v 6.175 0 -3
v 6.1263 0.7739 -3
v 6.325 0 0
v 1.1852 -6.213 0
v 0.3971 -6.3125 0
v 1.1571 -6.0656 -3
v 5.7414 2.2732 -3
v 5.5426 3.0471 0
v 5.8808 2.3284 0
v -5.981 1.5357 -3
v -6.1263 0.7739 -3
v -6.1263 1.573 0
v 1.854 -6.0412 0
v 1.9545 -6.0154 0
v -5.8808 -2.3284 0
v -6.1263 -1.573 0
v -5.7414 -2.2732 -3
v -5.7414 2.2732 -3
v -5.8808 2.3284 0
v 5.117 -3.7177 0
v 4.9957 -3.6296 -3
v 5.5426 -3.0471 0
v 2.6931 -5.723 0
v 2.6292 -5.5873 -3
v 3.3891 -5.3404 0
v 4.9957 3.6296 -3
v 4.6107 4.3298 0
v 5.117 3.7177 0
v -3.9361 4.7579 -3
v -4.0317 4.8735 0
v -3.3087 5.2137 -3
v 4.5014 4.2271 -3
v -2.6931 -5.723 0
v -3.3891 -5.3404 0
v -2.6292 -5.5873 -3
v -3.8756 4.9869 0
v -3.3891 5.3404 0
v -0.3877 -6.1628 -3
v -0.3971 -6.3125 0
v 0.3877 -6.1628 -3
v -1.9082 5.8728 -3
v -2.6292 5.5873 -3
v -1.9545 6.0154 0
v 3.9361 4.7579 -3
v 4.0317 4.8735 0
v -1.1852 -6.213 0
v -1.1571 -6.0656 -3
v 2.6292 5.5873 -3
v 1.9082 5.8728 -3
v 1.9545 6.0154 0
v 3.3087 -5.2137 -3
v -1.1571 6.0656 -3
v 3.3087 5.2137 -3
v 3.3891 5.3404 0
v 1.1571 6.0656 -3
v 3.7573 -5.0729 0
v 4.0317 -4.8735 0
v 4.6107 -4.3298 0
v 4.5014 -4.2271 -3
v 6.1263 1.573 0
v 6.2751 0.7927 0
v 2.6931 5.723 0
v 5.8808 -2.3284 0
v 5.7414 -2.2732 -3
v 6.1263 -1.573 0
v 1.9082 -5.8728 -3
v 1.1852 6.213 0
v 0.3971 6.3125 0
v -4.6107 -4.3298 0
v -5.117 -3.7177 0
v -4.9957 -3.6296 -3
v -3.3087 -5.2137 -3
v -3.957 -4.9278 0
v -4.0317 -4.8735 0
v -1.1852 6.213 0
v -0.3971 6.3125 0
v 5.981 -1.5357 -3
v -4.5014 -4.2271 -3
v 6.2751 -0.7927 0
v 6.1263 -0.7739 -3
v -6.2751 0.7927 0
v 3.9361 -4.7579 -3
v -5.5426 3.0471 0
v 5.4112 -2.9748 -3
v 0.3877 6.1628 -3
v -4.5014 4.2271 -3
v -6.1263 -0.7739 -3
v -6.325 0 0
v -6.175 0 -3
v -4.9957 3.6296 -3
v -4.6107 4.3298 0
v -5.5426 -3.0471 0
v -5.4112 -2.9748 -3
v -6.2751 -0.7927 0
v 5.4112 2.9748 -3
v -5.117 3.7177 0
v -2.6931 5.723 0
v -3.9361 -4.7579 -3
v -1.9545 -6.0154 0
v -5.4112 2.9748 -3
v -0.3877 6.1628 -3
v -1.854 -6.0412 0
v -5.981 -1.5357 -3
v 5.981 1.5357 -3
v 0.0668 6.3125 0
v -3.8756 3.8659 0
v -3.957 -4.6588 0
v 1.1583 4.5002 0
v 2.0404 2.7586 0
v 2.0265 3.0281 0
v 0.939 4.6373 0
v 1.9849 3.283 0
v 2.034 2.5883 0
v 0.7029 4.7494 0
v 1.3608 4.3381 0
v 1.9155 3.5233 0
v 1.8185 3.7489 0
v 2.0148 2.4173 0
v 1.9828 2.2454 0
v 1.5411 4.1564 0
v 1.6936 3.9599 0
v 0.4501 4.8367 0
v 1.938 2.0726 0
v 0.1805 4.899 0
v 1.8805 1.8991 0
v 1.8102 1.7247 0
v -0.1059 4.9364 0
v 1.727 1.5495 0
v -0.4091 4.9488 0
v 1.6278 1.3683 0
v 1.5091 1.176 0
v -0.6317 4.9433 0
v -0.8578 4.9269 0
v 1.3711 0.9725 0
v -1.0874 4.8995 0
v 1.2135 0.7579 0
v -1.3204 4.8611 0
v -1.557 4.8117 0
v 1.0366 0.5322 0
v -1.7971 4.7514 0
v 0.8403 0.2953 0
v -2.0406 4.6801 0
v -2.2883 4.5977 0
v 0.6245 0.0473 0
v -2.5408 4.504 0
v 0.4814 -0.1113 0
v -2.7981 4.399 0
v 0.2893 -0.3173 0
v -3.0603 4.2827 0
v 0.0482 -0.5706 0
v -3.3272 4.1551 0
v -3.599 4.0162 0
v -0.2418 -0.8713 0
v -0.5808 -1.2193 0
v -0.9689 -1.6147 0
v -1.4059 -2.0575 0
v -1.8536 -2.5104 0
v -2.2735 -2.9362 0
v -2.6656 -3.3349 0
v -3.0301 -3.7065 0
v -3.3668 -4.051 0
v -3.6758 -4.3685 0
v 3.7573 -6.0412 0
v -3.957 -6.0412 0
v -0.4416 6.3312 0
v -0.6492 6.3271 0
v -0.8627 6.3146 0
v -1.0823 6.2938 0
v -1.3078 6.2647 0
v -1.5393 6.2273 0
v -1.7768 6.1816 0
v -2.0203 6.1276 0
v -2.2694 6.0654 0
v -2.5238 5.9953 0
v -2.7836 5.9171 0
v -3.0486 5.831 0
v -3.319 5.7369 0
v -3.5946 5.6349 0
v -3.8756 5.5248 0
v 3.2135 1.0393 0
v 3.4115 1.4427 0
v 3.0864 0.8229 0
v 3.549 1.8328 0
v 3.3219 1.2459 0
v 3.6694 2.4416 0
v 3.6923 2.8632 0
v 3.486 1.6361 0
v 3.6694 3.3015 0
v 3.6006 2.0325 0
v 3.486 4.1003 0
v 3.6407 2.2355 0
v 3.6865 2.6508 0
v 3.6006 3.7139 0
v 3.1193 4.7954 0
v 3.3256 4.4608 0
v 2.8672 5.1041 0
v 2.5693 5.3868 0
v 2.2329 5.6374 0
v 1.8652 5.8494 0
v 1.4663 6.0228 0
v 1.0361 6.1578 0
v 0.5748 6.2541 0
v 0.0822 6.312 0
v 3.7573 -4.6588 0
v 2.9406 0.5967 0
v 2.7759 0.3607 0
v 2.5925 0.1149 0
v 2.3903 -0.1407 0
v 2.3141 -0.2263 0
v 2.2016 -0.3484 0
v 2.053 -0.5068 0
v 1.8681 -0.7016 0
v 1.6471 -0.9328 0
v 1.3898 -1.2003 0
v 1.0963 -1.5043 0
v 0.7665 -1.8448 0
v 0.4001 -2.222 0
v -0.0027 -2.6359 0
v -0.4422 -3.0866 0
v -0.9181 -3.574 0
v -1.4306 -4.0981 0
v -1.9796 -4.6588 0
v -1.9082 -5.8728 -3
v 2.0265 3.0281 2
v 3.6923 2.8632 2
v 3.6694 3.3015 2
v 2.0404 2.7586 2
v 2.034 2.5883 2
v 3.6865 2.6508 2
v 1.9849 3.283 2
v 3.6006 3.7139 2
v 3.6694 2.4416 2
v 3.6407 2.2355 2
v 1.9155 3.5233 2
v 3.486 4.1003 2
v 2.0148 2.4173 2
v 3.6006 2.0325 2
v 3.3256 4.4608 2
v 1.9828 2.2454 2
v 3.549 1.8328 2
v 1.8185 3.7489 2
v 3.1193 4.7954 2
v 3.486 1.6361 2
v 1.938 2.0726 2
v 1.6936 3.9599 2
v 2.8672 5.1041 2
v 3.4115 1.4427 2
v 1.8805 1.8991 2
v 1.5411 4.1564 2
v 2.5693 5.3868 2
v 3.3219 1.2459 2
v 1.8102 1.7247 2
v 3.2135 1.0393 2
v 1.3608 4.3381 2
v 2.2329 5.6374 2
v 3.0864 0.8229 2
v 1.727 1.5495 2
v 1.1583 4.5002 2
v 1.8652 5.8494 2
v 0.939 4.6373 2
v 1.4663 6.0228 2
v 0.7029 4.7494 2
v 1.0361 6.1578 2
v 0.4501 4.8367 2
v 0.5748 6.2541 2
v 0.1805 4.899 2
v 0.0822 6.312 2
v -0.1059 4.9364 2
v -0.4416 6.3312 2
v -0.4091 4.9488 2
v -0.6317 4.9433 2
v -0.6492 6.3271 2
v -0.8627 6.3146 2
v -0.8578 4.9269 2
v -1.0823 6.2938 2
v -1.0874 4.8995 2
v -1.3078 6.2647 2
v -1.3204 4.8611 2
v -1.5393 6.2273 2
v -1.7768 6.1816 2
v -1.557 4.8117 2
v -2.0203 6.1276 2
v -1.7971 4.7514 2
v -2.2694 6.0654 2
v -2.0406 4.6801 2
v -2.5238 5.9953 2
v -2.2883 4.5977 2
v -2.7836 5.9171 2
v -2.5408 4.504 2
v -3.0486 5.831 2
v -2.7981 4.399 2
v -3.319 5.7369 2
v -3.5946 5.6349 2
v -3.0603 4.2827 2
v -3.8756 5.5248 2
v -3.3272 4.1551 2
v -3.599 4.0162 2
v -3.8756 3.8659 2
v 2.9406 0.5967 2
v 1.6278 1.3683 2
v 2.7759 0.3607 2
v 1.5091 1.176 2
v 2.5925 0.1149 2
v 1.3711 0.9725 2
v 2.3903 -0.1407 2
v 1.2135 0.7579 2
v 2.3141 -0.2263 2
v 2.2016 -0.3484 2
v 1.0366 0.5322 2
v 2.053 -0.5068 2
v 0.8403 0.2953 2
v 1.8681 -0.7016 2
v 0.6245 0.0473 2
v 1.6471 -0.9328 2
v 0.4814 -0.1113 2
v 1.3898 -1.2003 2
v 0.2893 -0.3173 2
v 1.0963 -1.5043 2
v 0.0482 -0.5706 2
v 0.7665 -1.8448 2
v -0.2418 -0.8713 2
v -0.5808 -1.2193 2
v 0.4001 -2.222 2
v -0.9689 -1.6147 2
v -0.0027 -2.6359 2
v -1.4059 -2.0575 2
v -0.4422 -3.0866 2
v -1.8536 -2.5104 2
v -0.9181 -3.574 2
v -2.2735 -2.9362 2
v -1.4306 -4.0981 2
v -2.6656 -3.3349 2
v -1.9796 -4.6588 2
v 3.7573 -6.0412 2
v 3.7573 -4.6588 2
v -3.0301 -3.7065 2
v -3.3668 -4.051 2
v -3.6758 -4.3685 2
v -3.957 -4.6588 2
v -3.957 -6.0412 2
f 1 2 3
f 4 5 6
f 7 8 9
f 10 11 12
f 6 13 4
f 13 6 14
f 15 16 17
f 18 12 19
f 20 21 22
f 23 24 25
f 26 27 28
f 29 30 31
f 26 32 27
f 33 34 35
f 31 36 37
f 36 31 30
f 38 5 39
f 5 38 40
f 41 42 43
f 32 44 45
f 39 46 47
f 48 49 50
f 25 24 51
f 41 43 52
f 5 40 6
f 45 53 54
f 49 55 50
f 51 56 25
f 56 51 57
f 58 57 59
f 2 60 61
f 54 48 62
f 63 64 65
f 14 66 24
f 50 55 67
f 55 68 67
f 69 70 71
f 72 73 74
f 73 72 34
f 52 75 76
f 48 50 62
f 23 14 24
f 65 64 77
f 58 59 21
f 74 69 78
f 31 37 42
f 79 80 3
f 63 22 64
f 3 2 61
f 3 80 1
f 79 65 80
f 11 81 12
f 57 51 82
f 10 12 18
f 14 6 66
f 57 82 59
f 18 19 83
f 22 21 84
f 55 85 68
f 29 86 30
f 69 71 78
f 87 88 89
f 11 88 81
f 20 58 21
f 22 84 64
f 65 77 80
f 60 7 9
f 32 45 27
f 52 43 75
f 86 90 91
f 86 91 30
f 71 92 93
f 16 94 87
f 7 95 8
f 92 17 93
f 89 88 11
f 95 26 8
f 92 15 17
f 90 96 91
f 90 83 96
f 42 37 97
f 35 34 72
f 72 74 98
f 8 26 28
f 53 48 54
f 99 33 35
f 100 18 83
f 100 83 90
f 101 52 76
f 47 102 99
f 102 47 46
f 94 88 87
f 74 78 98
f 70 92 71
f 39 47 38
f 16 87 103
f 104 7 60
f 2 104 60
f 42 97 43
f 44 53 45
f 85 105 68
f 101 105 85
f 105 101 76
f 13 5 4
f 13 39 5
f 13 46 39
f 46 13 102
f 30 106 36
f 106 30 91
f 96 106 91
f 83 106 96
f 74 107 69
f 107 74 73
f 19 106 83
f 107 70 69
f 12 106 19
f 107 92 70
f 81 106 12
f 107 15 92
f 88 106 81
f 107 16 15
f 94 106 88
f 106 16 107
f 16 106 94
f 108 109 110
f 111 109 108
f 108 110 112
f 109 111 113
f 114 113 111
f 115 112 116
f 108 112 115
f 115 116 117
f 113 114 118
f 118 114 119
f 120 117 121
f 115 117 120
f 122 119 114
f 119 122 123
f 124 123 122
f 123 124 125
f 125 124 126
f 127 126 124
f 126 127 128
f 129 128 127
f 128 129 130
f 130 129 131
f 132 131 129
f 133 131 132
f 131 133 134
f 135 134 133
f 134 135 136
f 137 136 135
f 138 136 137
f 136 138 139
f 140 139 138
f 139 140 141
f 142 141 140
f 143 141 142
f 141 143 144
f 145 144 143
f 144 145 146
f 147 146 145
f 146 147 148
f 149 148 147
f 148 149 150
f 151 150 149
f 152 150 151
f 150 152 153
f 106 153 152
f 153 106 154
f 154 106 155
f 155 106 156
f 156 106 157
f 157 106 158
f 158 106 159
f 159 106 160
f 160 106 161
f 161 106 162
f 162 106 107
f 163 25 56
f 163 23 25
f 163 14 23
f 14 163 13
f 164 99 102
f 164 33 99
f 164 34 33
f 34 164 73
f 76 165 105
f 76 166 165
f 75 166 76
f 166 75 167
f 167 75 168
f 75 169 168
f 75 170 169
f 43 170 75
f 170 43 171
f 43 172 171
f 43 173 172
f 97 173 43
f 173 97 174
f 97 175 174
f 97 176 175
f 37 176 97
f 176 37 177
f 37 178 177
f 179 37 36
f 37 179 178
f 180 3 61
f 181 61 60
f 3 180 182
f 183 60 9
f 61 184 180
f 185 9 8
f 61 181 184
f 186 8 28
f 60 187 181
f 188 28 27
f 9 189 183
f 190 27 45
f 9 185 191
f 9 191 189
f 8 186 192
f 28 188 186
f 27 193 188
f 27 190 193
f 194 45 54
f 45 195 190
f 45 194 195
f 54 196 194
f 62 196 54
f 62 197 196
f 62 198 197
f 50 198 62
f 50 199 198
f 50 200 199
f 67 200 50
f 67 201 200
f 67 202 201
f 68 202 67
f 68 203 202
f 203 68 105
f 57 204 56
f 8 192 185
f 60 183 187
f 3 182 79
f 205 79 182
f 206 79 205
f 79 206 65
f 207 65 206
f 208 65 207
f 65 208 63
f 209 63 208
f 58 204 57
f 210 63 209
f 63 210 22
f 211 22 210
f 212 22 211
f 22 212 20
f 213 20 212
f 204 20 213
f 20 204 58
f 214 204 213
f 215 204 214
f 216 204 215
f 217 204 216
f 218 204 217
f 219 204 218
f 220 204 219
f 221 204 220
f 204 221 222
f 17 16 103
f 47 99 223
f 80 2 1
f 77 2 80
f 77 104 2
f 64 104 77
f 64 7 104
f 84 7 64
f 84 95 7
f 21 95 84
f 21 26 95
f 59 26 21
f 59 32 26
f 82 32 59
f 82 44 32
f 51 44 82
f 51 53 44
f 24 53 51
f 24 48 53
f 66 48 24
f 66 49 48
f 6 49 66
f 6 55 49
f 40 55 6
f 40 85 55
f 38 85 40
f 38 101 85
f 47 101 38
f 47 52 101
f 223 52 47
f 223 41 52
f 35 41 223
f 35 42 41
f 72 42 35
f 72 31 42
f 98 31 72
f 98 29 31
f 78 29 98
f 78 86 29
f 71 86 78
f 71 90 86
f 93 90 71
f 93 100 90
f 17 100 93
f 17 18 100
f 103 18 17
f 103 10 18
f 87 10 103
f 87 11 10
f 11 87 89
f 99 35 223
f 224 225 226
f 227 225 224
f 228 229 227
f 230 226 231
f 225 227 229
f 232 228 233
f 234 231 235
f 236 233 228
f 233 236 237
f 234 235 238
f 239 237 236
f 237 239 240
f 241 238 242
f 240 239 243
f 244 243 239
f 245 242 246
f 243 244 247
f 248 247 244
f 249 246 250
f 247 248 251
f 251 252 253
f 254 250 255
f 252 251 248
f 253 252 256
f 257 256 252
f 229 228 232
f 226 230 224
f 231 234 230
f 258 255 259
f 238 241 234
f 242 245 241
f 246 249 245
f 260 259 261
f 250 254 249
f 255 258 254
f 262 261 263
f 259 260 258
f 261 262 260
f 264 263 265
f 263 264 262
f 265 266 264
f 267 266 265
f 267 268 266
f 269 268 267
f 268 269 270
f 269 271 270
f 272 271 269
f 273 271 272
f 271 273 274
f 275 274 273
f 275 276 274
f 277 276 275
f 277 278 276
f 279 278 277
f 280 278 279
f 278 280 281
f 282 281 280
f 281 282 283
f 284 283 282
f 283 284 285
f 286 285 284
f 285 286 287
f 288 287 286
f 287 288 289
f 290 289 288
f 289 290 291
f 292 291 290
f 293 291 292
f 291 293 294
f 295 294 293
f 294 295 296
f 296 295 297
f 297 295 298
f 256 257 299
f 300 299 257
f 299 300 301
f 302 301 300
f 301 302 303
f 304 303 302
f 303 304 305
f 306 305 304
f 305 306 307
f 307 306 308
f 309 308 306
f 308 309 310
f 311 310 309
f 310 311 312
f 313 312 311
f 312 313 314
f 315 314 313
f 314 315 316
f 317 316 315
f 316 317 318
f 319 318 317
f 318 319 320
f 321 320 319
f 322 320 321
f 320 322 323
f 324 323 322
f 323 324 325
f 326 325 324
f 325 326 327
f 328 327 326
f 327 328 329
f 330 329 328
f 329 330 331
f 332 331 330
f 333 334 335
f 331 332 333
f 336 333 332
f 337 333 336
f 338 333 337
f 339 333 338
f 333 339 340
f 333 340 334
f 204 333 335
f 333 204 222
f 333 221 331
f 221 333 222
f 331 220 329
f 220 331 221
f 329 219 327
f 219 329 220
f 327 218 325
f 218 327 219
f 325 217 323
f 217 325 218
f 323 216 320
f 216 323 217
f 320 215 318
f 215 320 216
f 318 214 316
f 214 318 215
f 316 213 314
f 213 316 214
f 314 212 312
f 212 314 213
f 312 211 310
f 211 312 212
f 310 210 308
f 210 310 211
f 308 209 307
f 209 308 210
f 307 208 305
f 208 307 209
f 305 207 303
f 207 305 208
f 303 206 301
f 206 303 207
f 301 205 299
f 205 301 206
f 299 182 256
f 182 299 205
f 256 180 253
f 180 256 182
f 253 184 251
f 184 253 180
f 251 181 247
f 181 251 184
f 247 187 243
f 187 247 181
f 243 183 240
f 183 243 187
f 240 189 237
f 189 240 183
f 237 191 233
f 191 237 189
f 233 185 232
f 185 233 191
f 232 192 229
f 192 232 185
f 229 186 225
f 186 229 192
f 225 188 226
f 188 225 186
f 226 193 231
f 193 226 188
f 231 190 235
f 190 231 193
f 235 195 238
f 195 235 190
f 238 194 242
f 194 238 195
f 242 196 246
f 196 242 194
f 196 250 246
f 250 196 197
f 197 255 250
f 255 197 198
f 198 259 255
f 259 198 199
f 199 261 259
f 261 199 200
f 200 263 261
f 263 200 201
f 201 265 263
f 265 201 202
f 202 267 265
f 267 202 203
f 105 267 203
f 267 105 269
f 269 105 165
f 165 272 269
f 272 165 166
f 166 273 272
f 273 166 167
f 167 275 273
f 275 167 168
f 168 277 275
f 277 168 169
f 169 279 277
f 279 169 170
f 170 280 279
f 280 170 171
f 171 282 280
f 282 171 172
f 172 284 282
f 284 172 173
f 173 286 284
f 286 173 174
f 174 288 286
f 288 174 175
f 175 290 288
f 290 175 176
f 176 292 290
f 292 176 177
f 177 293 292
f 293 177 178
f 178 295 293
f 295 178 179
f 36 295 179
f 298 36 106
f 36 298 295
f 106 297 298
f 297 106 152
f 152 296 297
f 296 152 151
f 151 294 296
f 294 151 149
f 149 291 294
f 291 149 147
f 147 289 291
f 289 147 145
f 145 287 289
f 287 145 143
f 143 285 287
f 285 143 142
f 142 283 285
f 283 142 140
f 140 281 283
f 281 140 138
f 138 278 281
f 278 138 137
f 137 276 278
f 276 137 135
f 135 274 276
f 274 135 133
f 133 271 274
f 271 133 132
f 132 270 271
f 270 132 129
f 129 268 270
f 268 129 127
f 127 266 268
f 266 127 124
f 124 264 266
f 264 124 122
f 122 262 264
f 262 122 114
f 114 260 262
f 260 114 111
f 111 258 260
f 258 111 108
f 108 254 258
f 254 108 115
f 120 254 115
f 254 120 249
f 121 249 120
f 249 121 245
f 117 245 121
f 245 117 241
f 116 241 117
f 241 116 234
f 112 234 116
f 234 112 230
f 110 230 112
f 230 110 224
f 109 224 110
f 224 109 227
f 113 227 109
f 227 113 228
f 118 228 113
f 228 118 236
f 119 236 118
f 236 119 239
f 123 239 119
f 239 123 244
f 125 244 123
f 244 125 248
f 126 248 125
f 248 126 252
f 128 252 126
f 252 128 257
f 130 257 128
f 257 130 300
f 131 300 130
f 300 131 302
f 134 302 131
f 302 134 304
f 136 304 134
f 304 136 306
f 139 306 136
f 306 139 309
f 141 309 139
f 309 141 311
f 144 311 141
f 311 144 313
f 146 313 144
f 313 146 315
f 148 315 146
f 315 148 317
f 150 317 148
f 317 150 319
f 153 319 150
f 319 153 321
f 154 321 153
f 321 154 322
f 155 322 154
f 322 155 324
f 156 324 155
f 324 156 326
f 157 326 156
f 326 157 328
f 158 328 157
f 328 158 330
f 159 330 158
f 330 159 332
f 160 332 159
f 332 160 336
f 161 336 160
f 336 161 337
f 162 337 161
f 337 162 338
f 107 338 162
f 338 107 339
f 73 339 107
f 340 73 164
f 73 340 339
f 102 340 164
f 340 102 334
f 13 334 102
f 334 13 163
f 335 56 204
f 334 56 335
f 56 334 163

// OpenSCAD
$fn = 50;

difference() {
	union() {
		translate(v = [0, 0, -3.0]) {
			cylinder(h = 3, r1 = 6.175, r2 = 6.325);
		}
		linear_extrude(height = 2) {
			text(font = "Impact", halign = "center", size = 12, text = "2", valign = "center");
		}
	}
	union();
}
